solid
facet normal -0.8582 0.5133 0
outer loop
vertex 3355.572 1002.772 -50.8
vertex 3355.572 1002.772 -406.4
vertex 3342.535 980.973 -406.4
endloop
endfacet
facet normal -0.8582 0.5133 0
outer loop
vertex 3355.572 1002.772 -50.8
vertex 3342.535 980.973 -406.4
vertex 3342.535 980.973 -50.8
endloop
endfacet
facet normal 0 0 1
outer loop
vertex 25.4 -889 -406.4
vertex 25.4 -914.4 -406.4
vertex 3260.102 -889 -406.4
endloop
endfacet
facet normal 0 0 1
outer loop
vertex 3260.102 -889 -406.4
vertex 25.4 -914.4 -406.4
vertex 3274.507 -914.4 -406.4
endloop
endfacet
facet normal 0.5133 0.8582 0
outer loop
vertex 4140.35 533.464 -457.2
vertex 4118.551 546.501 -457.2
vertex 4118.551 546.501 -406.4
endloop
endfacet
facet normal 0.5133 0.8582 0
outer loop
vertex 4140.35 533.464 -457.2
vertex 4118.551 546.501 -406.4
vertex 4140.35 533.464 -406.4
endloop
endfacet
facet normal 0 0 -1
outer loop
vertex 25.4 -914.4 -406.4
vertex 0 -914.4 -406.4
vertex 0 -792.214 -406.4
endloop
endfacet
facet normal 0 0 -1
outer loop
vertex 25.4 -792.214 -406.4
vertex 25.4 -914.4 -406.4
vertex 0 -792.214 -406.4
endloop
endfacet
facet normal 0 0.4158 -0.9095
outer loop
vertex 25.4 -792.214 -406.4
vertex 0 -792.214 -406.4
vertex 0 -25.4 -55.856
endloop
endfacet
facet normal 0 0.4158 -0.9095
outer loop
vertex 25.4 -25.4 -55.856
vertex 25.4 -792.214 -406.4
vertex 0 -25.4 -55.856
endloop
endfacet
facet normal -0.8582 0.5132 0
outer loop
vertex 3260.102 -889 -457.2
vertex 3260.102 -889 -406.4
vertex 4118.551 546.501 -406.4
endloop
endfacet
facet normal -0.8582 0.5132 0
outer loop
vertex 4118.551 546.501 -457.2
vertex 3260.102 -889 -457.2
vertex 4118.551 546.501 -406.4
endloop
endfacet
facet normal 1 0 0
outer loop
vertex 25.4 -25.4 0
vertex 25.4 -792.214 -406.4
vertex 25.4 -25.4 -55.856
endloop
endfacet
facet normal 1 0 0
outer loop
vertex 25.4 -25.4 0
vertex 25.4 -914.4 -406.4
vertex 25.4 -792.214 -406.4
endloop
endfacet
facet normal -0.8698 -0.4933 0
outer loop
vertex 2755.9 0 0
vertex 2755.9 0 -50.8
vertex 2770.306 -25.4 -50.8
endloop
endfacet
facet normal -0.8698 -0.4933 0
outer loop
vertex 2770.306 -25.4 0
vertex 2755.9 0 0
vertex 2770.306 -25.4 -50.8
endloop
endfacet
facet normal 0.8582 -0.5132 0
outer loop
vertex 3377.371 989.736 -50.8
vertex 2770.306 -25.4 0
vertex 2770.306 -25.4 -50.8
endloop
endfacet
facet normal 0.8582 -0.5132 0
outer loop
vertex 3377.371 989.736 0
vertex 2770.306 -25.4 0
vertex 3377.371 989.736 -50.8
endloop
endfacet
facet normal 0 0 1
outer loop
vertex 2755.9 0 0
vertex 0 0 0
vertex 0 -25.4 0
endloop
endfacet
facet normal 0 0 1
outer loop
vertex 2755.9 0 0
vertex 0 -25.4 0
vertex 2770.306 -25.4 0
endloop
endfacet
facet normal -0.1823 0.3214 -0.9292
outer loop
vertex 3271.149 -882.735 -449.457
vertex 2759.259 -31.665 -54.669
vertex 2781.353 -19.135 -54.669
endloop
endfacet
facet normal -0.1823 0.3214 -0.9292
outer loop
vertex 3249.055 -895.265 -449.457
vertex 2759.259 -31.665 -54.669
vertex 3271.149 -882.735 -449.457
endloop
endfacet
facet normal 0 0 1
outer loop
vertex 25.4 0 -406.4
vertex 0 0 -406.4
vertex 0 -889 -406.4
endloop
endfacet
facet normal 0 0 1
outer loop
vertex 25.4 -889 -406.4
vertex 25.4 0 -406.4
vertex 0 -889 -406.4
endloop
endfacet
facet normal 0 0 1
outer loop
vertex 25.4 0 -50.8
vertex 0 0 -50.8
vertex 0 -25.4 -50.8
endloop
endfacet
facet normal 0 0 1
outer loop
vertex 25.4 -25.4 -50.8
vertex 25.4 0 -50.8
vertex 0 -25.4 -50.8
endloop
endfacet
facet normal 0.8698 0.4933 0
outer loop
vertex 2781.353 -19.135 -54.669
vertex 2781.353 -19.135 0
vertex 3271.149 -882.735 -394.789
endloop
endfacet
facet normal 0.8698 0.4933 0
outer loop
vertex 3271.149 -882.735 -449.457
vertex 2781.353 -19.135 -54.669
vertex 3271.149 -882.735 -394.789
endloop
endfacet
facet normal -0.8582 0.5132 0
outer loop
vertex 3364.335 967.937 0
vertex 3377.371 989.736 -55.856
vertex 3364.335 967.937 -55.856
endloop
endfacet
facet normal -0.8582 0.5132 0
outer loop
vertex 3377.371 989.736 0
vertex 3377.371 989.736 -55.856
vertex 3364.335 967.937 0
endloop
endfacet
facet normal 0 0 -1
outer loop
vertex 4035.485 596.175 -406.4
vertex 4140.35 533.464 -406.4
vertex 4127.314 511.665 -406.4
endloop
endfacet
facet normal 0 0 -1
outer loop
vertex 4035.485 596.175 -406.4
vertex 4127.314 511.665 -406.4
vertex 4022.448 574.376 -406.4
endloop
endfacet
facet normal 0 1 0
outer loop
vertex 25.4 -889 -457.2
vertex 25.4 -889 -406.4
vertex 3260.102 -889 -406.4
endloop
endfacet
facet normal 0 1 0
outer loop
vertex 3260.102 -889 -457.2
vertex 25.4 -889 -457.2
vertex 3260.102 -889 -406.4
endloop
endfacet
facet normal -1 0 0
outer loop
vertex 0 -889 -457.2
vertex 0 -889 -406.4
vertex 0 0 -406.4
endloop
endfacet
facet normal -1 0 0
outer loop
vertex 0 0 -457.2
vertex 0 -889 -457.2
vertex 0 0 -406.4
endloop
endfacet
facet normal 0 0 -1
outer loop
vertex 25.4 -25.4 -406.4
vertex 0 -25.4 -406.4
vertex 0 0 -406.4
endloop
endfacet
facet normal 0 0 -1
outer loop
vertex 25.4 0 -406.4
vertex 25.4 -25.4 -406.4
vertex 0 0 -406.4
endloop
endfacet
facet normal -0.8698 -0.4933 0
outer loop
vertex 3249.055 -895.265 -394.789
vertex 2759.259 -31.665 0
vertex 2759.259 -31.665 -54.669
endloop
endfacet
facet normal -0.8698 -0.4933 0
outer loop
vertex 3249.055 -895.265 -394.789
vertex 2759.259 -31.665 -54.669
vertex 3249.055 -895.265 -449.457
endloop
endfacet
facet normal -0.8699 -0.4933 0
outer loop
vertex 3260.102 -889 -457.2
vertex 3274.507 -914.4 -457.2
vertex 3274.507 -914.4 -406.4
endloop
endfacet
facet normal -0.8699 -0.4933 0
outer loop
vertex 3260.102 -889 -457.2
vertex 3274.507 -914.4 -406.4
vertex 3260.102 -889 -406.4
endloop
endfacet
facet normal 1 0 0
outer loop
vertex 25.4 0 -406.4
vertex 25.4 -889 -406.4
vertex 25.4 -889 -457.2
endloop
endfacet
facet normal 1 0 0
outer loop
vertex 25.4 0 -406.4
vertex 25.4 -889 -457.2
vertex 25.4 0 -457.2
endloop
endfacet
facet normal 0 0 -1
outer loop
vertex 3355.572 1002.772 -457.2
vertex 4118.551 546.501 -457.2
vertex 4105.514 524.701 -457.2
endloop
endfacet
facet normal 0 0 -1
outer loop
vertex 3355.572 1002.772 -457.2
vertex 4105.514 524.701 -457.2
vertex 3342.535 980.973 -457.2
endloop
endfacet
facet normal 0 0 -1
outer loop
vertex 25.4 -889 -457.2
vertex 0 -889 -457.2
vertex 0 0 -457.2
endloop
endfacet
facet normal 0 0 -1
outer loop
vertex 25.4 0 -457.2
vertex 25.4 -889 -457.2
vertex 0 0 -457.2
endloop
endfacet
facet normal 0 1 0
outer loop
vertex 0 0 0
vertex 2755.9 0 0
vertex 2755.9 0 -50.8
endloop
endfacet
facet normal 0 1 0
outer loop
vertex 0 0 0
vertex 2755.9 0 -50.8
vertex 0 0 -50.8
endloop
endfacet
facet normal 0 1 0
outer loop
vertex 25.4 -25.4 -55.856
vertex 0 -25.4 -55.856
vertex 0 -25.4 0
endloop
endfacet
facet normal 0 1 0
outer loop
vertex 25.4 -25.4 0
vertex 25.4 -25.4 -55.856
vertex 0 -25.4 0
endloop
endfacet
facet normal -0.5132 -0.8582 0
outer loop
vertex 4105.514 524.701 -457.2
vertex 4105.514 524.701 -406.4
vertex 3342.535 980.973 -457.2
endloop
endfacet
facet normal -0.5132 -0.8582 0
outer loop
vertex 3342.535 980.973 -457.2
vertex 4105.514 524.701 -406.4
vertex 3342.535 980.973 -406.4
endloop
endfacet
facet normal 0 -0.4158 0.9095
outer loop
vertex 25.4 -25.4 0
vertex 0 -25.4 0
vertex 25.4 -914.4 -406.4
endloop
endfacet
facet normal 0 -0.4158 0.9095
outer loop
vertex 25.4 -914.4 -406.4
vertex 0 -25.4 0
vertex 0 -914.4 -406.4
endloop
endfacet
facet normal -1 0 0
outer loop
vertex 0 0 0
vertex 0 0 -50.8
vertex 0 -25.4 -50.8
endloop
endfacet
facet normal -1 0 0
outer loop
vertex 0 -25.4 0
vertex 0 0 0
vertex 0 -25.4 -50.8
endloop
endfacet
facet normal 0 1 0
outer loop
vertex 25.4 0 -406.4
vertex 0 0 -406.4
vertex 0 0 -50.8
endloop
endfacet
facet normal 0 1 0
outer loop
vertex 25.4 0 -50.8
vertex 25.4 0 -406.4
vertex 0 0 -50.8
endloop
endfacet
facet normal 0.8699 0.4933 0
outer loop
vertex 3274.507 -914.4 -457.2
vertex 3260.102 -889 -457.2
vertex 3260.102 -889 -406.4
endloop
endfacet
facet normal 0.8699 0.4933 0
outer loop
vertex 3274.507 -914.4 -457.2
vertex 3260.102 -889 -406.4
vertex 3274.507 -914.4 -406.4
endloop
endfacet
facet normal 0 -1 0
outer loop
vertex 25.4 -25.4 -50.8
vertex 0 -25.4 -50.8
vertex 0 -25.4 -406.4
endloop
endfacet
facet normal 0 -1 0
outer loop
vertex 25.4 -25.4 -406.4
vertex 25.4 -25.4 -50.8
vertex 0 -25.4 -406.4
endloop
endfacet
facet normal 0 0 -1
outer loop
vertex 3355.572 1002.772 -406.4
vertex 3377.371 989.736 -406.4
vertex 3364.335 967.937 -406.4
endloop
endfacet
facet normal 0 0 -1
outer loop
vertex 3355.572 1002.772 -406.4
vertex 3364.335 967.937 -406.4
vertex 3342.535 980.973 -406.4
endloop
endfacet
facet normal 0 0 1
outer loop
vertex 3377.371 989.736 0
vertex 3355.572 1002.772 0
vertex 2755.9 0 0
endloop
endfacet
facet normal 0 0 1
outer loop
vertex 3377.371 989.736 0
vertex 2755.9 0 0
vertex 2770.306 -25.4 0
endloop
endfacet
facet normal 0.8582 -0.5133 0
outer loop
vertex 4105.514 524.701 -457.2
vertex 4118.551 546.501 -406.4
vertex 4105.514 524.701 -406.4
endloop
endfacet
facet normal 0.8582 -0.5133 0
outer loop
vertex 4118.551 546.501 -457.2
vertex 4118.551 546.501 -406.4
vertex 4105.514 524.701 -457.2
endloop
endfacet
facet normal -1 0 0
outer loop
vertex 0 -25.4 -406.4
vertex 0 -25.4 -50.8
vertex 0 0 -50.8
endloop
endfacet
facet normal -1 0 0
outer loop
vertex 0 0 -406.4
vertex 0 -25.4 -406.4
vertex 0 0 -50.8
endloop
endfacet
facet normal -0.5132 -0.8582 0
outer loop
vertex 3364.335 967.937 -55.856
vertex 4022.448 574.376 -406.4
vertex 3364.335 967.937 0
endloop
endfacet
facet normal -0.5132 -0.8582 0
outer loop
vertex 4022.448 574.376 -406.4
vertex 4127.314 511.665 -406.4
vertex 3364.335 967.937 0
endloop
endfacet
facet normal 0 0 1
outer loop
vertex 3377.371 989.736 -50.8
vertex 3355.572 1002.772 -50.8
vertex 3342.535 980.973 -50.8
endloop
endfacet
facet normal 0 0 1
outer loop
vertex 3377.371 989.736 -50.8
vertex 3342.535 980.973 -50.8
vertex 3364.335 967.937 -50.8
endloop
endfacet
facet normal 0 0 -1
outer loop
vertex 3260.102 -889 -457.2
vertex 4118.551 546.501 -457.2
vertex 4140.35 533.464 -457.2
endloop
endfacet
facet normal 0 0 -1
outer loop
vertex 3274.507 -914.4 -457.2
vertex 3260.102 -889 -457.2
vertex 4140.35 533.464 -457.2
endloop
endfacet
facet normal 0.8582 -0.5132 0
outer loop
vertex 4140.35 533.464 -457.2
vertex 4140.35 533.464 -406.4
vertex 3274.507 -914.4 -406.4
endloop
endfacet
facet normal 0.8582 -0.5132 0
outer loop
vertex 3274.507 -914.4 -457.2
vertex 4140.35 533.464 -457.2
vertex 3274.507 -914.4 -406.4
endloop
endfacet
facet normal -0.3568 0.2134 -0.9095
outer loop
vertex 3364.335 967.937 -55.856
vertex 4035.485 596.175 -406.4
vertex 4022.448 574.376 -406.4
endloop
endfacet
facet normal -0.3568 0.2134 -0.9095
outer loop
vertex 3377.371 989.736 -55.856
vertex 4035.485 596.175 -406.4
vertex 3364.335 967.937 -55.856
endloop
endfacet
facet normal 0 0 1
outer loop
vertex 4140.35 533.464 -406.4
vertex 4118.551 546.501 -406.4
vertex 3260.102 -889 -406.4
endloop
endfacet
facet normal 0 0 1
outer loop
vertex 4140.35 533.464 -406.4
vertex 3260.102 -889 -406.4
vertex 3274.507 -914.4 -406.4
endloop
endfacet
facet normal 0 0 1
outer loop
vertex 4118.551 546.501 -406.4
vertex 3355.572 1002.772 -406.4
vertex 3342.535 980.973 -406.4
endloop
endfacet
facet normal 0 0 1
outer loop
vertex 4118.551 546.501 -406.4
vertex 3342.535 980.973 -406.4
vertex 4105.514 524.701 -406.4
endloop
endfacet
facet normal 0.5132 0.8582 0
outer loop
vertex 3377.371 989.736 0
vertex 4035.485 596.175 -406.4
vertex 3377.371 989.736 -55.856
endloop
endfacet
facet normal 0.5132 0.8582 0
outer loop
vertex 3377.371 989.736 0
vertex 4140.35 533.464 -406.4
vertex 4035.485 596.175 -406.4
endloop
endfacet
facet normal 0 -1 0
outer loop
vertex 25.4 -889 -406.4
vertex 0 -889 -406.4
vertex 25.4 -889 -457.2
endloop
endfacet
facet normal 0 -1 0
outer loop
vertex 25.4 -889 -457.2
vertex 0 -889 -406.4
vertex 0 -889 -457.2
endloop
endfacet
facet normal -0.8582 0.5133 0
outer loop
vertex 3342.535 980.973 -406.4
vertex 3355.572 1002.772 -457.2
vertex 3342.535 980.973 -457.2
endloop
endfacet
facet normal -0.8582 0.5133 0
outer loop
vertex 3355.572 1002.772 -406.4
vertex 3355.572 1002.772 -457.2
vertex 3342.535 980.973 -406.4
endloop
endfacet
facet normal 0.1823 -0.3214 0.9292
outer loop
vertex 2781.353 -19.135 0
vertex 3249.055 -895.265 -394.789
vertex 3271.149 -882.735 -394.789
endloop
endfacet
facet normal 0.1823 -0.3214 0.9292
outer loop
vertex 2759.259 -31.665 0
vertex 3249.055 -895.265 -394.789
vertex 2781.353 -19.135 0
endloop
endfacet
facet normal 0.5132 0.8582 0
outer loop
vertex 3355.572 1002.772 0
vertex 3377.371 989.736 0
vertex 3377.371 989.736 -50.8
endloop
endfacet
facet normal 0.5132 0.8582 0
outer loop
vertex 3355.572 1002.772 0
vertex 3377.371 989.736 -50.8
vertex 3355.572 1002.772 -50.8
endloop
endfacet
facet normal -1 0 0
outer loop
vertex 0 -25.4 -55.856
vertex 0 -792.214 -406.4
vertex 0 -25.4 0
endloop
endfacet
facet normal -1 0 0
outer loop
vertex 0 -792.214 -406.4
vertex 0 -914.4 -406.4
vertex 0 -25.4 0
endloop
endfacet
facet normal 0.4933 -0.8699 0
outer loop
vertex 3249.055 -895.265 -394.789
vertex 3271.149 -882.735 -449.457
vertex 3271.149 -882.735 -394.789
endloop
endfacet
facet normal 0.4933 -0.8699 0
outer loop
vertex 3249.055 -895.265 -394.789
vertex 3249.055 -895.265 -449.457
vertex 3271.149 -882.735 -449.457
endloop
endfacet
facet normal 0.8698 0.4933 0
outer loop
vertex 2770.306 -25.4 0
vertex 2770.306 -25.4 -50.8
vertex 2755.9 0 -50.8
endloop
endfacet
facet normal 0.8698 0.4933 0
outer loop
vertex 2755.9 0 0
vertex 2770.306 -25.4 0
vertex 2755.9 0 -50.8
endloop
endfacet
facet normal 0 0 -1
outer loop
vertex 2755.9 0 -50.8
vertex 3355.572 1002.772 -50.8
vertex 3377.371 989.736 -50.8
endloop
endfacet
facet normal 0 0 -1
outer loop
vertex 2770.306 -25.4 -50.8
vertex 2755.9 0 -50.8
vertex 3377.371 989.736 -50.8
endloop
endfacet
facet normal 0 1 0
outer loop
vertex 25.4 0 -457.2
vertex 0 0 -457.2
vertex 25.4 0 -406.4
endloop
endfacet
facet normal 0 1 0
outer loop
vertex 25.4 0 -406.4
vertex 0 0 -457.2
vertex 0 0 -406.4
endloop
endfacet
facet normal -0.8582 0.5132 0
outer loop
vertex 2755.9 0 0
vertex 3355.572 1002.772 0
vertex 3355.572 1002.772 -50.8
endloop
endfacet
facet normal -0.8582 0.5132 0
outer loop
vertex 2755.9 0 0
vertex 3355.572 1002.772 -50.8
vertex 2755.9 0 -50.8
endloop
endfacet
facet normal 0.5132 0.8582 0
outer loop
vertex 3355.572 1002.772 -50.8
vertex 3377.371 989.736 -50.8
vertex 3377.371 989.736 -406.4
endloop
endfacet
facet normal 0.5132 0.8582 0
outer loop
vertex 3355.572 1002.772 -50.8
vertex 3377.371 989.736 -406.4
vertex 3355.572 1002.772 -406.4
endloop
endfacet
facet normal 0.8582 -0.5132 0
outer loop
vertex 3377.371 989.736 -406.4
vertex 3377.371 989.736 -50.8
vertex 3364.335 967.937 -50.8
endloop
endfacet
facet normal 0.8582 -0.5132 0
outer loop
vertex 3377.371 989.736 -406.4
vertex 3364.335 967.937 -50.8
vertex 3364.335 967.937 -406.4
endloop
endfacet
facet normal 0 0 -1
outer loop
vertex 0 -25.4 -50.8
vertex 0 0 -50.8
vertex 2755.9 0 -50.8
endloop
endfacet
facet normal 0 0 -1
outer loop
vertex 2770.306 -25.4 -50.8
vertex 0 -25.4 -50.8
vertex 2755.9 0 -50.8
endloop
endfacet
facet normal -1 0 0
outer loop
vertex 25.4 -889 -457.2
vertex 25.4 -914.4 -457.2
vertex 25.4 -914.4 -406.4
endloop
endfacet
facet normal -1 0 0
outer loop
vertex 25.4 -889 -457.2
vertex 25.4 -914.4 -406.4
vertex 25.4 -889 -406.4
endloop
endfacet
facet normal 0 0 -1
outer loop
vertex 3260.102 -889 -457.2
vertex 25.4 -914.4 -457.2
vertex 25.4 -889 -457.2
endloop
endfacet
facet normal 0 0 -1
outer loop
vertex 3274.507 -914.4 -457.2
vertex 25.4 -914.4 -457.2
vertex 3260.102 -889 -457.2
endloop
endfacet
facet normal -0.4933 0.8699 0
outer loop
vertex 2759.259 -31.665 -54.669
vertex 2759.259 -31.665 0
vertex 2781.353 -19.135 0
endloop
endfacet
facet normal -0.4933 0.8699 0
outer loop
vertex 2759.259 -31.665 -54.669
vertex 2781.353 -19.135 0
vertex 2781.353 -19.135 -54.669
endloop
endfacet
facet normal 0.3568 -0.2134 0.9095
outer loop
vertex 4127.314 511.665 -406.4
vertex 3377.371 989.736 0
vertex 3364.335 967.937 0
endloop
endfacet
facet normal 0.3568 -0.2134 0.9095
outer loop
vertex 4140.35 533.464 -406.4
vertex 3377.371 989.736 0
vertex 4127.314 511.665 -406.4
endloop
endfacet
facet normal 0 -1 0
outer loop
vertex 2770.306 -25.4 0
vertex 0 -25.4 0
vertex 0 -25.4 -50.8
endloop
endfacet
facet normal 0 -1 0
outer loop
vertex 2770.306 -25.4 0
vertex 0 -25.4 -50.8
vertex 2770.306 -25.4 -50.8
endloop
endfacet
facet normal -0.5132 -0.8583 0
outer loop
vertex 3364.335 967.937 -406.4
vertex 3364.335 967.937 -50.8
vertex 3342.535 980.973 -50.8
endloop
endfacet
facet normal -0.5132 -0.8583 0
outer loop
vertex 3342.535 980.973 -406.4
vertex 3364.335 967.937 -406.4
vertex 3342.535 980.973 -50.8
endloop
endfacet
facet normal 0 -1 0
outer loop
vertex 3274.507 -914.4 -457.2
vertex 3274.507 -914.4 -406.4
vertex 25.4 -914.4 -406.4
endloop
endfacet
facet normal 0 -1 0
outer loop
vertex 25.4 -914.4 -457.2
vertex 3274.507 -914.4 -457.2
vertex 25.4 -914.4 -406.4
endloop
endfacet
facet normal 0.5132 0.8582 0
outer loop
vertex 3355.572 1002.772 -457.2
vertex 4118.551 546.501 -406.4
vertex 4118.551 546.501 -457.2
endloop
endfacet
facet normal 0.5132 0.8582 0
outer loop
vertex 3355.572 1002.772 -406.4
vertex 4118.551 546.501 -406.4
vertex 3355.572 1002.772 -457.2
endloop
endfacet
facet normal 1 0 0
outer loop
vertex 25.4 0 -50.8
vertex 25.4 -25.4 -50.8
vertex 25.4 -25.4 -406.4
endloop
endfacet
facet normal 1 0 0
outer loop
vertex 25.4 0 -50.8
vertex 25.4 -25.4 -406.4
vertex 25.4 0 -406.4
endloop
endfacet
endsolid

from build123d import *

# Parameters (mm, degrees)
F1_DEPTH       = 50.8
F2_DEPTH       = 50.8
F4_DEPTH       = 25.4
F5_DEPTH       = 25.4
F6_DEPTH       = 25.4
F8_DEPTH       = 25.4
F9_DEPTH       = 25.4
F10_DEPTH      = 25.4
F12_DEPTH      = 50.8
F13_DEPTH      = 50.8
F16_DEPTH      = 12.7
F16_DEPTH_BACK = 12.7


with BuildPart() as f1:
    # F0 (on Top) → F1 (new body)
    with BuildSketch(Plane.XY):
        Polygon((2755.9, 0), (0, 0), (0, -25.4), (2770.3057624632, -25.4), align=None)
    extrude(amount=-F1_DEPTH)


with BuildPart() as f2:
    # F0 (on Top) → F2 (new body)
    with BuildSketch(Plane.XY):
        Polygon((3355.5716018378, 1002.7724218133), (2755.9, 0), (2770.3057624632, -25.4), (3377.371002312, 989.7360826429), align=None)
    extrude(amount=-F2_DEPTH)


with BuildPart() as f4:
    # F3 (on Right) → F4 (new body)
    with BuildSketch(Plane.YZ):
        Polygon((-792.2140530789, -406.4), (-25.4, -55.8564328782), (-25.4, -50.8), (-25.4, 0), (-914.4, -406.4), (-889, -406.4), align=None)
    extrude(amount=F4_DEPTH)


with BuildPart() as f5:
    # F3 (on Right) → F5 (new body)
    with BuildSketch(Plane.YZ):
        Polygon((-25.4, -50.8), (-25.4, -55.8564328782), (-25.4, -406.4), (0, -406.4), (0, -50.8), align=None)
    extrude(amount=F5_DEPTH)


with BuildPart() as f6:
    # F3 (on Right) → F6 (new body)
    with BuildSketch(Plane.YZ):
        Polygon((-25.4, -406.4), (-792.2140530789, -406.4), (-889, -406.4), (-889, -457.2), (0, -457.2), (0, -406.4), align=None)
    extrude(amount=F6_DEPTH)


with BuildPart() as f8:
    # F7 (on face) → F8 (new body)
    with BuildSketch(Plane(origin=(1325.6226285205, 2216.7096283002, 0), x_dir=(-0.8582441132, 0.5132416996, 0), z_dir=(0.5132416996, 0.8582441132, 0))):
        Polygon((-2390.6349514509, -50.8), (-2390.6349514509, 0), (-3279.6349514509, -406.4), (-3254.2349514509, -406.4), (-3157.4490045299, -406.4), (-2390.6349514509, -55.8564328782), align=None)
    extrude(amount=-F8_DEPTH)


with BuildPart() as f9:
    # F7 (on face) → F9 (new body)
    with BuildSketch(Plane(origin=(1325.6226285205, 2216.7096283002, 0), x_dir=(-0.8582441132, 0.5132416996, 0), z_dir=(0.5132416996, 0.8582441132, 0))):
        Polygon((-2365.2349514509, -50.8), (-2390.6349514509, -50.8), (-2390.6349514509, -55.8564328782), (-2390.6349514509, -406.4), (-2365.2349514509, -406.4), align=None)
    extrude(amount=-F9_DEPTH)


with BuildPart() as f10:
    # F7 (on face) → F10 (new body)
    with BuildSketch(Plane(origin=(1325.6226285205, 2216.7096283002, 0), x_dir=(-0.8582441132, 0.5132416996, 0), z_dir=(0.5132416996, 0.8582441132, 0))):
        Polygon((-3157.4490045299, -406.4), (-3254.2349514509, -406.4), (-3254.2349514509, -457.2), (-2365.2349514509, -457.2), (-2365.2349514509, -406.4), (-2390.6349514509, -406.4), align=None)
    extrude(amount=-F10_DEPTH)


with BuildPart() as f12:
    # F11 (on face) → F12 (new body)
    with BuildSketch(Plane(origin=(0, 0, -406.4), x_dir=(1, 0, 0), z_dir=(0, 0, -1))):
        Polygon((3274.5074486763, 914.4), (25.4, 914.4), (25.4, 889), (3260.1016862131, 889), align=None)
    extrude(amount=F12_DEPTH)


with BuildPart() as f13:
    # F11 (on face) → F13 (new body)
    with BuildSketch(Plane(origin=(0, 0, -406.4), x_dir=(1, 0, 0), z_dir=(0, 0, -1))):
        Polygon((4140.3500189091, -533.4642116794), (3274.5074486763, 914.4), (3260.1016862131, 889), (4118.5506184349, -546.5005508498), align=None)
    extrude(amount=F13_DEPTH)


with BuildPart() as f16:
    # F15 (on 3pt) → F16 (new body, two sides)
    with BuildSketch(Plane(origin=(2085.1713999935, 1182.6174757255, 0), x_dir=(0.4933347243, -0.8698395541, 0), z_dir=(-0.8698395541, -0.4933347243, 0))) as f16_sk:
        Polygon((2381.6087300829, -394.7885714286), (1388.781954194, 0), (1388.781954194, -54.6688801052), (2381.6087300829, -449.4574515337), align=None)
    extrude(amount=F16_DEPTH)
    extrude(f16_sk.sketch, amount=-F16_DEPTH_BACK)


solid = Compound([f1.part, f2.part, f4.part, f5.part, f6.part, f8.part, f9.part, f10.part, f12.part, f13.part, f16.part])
